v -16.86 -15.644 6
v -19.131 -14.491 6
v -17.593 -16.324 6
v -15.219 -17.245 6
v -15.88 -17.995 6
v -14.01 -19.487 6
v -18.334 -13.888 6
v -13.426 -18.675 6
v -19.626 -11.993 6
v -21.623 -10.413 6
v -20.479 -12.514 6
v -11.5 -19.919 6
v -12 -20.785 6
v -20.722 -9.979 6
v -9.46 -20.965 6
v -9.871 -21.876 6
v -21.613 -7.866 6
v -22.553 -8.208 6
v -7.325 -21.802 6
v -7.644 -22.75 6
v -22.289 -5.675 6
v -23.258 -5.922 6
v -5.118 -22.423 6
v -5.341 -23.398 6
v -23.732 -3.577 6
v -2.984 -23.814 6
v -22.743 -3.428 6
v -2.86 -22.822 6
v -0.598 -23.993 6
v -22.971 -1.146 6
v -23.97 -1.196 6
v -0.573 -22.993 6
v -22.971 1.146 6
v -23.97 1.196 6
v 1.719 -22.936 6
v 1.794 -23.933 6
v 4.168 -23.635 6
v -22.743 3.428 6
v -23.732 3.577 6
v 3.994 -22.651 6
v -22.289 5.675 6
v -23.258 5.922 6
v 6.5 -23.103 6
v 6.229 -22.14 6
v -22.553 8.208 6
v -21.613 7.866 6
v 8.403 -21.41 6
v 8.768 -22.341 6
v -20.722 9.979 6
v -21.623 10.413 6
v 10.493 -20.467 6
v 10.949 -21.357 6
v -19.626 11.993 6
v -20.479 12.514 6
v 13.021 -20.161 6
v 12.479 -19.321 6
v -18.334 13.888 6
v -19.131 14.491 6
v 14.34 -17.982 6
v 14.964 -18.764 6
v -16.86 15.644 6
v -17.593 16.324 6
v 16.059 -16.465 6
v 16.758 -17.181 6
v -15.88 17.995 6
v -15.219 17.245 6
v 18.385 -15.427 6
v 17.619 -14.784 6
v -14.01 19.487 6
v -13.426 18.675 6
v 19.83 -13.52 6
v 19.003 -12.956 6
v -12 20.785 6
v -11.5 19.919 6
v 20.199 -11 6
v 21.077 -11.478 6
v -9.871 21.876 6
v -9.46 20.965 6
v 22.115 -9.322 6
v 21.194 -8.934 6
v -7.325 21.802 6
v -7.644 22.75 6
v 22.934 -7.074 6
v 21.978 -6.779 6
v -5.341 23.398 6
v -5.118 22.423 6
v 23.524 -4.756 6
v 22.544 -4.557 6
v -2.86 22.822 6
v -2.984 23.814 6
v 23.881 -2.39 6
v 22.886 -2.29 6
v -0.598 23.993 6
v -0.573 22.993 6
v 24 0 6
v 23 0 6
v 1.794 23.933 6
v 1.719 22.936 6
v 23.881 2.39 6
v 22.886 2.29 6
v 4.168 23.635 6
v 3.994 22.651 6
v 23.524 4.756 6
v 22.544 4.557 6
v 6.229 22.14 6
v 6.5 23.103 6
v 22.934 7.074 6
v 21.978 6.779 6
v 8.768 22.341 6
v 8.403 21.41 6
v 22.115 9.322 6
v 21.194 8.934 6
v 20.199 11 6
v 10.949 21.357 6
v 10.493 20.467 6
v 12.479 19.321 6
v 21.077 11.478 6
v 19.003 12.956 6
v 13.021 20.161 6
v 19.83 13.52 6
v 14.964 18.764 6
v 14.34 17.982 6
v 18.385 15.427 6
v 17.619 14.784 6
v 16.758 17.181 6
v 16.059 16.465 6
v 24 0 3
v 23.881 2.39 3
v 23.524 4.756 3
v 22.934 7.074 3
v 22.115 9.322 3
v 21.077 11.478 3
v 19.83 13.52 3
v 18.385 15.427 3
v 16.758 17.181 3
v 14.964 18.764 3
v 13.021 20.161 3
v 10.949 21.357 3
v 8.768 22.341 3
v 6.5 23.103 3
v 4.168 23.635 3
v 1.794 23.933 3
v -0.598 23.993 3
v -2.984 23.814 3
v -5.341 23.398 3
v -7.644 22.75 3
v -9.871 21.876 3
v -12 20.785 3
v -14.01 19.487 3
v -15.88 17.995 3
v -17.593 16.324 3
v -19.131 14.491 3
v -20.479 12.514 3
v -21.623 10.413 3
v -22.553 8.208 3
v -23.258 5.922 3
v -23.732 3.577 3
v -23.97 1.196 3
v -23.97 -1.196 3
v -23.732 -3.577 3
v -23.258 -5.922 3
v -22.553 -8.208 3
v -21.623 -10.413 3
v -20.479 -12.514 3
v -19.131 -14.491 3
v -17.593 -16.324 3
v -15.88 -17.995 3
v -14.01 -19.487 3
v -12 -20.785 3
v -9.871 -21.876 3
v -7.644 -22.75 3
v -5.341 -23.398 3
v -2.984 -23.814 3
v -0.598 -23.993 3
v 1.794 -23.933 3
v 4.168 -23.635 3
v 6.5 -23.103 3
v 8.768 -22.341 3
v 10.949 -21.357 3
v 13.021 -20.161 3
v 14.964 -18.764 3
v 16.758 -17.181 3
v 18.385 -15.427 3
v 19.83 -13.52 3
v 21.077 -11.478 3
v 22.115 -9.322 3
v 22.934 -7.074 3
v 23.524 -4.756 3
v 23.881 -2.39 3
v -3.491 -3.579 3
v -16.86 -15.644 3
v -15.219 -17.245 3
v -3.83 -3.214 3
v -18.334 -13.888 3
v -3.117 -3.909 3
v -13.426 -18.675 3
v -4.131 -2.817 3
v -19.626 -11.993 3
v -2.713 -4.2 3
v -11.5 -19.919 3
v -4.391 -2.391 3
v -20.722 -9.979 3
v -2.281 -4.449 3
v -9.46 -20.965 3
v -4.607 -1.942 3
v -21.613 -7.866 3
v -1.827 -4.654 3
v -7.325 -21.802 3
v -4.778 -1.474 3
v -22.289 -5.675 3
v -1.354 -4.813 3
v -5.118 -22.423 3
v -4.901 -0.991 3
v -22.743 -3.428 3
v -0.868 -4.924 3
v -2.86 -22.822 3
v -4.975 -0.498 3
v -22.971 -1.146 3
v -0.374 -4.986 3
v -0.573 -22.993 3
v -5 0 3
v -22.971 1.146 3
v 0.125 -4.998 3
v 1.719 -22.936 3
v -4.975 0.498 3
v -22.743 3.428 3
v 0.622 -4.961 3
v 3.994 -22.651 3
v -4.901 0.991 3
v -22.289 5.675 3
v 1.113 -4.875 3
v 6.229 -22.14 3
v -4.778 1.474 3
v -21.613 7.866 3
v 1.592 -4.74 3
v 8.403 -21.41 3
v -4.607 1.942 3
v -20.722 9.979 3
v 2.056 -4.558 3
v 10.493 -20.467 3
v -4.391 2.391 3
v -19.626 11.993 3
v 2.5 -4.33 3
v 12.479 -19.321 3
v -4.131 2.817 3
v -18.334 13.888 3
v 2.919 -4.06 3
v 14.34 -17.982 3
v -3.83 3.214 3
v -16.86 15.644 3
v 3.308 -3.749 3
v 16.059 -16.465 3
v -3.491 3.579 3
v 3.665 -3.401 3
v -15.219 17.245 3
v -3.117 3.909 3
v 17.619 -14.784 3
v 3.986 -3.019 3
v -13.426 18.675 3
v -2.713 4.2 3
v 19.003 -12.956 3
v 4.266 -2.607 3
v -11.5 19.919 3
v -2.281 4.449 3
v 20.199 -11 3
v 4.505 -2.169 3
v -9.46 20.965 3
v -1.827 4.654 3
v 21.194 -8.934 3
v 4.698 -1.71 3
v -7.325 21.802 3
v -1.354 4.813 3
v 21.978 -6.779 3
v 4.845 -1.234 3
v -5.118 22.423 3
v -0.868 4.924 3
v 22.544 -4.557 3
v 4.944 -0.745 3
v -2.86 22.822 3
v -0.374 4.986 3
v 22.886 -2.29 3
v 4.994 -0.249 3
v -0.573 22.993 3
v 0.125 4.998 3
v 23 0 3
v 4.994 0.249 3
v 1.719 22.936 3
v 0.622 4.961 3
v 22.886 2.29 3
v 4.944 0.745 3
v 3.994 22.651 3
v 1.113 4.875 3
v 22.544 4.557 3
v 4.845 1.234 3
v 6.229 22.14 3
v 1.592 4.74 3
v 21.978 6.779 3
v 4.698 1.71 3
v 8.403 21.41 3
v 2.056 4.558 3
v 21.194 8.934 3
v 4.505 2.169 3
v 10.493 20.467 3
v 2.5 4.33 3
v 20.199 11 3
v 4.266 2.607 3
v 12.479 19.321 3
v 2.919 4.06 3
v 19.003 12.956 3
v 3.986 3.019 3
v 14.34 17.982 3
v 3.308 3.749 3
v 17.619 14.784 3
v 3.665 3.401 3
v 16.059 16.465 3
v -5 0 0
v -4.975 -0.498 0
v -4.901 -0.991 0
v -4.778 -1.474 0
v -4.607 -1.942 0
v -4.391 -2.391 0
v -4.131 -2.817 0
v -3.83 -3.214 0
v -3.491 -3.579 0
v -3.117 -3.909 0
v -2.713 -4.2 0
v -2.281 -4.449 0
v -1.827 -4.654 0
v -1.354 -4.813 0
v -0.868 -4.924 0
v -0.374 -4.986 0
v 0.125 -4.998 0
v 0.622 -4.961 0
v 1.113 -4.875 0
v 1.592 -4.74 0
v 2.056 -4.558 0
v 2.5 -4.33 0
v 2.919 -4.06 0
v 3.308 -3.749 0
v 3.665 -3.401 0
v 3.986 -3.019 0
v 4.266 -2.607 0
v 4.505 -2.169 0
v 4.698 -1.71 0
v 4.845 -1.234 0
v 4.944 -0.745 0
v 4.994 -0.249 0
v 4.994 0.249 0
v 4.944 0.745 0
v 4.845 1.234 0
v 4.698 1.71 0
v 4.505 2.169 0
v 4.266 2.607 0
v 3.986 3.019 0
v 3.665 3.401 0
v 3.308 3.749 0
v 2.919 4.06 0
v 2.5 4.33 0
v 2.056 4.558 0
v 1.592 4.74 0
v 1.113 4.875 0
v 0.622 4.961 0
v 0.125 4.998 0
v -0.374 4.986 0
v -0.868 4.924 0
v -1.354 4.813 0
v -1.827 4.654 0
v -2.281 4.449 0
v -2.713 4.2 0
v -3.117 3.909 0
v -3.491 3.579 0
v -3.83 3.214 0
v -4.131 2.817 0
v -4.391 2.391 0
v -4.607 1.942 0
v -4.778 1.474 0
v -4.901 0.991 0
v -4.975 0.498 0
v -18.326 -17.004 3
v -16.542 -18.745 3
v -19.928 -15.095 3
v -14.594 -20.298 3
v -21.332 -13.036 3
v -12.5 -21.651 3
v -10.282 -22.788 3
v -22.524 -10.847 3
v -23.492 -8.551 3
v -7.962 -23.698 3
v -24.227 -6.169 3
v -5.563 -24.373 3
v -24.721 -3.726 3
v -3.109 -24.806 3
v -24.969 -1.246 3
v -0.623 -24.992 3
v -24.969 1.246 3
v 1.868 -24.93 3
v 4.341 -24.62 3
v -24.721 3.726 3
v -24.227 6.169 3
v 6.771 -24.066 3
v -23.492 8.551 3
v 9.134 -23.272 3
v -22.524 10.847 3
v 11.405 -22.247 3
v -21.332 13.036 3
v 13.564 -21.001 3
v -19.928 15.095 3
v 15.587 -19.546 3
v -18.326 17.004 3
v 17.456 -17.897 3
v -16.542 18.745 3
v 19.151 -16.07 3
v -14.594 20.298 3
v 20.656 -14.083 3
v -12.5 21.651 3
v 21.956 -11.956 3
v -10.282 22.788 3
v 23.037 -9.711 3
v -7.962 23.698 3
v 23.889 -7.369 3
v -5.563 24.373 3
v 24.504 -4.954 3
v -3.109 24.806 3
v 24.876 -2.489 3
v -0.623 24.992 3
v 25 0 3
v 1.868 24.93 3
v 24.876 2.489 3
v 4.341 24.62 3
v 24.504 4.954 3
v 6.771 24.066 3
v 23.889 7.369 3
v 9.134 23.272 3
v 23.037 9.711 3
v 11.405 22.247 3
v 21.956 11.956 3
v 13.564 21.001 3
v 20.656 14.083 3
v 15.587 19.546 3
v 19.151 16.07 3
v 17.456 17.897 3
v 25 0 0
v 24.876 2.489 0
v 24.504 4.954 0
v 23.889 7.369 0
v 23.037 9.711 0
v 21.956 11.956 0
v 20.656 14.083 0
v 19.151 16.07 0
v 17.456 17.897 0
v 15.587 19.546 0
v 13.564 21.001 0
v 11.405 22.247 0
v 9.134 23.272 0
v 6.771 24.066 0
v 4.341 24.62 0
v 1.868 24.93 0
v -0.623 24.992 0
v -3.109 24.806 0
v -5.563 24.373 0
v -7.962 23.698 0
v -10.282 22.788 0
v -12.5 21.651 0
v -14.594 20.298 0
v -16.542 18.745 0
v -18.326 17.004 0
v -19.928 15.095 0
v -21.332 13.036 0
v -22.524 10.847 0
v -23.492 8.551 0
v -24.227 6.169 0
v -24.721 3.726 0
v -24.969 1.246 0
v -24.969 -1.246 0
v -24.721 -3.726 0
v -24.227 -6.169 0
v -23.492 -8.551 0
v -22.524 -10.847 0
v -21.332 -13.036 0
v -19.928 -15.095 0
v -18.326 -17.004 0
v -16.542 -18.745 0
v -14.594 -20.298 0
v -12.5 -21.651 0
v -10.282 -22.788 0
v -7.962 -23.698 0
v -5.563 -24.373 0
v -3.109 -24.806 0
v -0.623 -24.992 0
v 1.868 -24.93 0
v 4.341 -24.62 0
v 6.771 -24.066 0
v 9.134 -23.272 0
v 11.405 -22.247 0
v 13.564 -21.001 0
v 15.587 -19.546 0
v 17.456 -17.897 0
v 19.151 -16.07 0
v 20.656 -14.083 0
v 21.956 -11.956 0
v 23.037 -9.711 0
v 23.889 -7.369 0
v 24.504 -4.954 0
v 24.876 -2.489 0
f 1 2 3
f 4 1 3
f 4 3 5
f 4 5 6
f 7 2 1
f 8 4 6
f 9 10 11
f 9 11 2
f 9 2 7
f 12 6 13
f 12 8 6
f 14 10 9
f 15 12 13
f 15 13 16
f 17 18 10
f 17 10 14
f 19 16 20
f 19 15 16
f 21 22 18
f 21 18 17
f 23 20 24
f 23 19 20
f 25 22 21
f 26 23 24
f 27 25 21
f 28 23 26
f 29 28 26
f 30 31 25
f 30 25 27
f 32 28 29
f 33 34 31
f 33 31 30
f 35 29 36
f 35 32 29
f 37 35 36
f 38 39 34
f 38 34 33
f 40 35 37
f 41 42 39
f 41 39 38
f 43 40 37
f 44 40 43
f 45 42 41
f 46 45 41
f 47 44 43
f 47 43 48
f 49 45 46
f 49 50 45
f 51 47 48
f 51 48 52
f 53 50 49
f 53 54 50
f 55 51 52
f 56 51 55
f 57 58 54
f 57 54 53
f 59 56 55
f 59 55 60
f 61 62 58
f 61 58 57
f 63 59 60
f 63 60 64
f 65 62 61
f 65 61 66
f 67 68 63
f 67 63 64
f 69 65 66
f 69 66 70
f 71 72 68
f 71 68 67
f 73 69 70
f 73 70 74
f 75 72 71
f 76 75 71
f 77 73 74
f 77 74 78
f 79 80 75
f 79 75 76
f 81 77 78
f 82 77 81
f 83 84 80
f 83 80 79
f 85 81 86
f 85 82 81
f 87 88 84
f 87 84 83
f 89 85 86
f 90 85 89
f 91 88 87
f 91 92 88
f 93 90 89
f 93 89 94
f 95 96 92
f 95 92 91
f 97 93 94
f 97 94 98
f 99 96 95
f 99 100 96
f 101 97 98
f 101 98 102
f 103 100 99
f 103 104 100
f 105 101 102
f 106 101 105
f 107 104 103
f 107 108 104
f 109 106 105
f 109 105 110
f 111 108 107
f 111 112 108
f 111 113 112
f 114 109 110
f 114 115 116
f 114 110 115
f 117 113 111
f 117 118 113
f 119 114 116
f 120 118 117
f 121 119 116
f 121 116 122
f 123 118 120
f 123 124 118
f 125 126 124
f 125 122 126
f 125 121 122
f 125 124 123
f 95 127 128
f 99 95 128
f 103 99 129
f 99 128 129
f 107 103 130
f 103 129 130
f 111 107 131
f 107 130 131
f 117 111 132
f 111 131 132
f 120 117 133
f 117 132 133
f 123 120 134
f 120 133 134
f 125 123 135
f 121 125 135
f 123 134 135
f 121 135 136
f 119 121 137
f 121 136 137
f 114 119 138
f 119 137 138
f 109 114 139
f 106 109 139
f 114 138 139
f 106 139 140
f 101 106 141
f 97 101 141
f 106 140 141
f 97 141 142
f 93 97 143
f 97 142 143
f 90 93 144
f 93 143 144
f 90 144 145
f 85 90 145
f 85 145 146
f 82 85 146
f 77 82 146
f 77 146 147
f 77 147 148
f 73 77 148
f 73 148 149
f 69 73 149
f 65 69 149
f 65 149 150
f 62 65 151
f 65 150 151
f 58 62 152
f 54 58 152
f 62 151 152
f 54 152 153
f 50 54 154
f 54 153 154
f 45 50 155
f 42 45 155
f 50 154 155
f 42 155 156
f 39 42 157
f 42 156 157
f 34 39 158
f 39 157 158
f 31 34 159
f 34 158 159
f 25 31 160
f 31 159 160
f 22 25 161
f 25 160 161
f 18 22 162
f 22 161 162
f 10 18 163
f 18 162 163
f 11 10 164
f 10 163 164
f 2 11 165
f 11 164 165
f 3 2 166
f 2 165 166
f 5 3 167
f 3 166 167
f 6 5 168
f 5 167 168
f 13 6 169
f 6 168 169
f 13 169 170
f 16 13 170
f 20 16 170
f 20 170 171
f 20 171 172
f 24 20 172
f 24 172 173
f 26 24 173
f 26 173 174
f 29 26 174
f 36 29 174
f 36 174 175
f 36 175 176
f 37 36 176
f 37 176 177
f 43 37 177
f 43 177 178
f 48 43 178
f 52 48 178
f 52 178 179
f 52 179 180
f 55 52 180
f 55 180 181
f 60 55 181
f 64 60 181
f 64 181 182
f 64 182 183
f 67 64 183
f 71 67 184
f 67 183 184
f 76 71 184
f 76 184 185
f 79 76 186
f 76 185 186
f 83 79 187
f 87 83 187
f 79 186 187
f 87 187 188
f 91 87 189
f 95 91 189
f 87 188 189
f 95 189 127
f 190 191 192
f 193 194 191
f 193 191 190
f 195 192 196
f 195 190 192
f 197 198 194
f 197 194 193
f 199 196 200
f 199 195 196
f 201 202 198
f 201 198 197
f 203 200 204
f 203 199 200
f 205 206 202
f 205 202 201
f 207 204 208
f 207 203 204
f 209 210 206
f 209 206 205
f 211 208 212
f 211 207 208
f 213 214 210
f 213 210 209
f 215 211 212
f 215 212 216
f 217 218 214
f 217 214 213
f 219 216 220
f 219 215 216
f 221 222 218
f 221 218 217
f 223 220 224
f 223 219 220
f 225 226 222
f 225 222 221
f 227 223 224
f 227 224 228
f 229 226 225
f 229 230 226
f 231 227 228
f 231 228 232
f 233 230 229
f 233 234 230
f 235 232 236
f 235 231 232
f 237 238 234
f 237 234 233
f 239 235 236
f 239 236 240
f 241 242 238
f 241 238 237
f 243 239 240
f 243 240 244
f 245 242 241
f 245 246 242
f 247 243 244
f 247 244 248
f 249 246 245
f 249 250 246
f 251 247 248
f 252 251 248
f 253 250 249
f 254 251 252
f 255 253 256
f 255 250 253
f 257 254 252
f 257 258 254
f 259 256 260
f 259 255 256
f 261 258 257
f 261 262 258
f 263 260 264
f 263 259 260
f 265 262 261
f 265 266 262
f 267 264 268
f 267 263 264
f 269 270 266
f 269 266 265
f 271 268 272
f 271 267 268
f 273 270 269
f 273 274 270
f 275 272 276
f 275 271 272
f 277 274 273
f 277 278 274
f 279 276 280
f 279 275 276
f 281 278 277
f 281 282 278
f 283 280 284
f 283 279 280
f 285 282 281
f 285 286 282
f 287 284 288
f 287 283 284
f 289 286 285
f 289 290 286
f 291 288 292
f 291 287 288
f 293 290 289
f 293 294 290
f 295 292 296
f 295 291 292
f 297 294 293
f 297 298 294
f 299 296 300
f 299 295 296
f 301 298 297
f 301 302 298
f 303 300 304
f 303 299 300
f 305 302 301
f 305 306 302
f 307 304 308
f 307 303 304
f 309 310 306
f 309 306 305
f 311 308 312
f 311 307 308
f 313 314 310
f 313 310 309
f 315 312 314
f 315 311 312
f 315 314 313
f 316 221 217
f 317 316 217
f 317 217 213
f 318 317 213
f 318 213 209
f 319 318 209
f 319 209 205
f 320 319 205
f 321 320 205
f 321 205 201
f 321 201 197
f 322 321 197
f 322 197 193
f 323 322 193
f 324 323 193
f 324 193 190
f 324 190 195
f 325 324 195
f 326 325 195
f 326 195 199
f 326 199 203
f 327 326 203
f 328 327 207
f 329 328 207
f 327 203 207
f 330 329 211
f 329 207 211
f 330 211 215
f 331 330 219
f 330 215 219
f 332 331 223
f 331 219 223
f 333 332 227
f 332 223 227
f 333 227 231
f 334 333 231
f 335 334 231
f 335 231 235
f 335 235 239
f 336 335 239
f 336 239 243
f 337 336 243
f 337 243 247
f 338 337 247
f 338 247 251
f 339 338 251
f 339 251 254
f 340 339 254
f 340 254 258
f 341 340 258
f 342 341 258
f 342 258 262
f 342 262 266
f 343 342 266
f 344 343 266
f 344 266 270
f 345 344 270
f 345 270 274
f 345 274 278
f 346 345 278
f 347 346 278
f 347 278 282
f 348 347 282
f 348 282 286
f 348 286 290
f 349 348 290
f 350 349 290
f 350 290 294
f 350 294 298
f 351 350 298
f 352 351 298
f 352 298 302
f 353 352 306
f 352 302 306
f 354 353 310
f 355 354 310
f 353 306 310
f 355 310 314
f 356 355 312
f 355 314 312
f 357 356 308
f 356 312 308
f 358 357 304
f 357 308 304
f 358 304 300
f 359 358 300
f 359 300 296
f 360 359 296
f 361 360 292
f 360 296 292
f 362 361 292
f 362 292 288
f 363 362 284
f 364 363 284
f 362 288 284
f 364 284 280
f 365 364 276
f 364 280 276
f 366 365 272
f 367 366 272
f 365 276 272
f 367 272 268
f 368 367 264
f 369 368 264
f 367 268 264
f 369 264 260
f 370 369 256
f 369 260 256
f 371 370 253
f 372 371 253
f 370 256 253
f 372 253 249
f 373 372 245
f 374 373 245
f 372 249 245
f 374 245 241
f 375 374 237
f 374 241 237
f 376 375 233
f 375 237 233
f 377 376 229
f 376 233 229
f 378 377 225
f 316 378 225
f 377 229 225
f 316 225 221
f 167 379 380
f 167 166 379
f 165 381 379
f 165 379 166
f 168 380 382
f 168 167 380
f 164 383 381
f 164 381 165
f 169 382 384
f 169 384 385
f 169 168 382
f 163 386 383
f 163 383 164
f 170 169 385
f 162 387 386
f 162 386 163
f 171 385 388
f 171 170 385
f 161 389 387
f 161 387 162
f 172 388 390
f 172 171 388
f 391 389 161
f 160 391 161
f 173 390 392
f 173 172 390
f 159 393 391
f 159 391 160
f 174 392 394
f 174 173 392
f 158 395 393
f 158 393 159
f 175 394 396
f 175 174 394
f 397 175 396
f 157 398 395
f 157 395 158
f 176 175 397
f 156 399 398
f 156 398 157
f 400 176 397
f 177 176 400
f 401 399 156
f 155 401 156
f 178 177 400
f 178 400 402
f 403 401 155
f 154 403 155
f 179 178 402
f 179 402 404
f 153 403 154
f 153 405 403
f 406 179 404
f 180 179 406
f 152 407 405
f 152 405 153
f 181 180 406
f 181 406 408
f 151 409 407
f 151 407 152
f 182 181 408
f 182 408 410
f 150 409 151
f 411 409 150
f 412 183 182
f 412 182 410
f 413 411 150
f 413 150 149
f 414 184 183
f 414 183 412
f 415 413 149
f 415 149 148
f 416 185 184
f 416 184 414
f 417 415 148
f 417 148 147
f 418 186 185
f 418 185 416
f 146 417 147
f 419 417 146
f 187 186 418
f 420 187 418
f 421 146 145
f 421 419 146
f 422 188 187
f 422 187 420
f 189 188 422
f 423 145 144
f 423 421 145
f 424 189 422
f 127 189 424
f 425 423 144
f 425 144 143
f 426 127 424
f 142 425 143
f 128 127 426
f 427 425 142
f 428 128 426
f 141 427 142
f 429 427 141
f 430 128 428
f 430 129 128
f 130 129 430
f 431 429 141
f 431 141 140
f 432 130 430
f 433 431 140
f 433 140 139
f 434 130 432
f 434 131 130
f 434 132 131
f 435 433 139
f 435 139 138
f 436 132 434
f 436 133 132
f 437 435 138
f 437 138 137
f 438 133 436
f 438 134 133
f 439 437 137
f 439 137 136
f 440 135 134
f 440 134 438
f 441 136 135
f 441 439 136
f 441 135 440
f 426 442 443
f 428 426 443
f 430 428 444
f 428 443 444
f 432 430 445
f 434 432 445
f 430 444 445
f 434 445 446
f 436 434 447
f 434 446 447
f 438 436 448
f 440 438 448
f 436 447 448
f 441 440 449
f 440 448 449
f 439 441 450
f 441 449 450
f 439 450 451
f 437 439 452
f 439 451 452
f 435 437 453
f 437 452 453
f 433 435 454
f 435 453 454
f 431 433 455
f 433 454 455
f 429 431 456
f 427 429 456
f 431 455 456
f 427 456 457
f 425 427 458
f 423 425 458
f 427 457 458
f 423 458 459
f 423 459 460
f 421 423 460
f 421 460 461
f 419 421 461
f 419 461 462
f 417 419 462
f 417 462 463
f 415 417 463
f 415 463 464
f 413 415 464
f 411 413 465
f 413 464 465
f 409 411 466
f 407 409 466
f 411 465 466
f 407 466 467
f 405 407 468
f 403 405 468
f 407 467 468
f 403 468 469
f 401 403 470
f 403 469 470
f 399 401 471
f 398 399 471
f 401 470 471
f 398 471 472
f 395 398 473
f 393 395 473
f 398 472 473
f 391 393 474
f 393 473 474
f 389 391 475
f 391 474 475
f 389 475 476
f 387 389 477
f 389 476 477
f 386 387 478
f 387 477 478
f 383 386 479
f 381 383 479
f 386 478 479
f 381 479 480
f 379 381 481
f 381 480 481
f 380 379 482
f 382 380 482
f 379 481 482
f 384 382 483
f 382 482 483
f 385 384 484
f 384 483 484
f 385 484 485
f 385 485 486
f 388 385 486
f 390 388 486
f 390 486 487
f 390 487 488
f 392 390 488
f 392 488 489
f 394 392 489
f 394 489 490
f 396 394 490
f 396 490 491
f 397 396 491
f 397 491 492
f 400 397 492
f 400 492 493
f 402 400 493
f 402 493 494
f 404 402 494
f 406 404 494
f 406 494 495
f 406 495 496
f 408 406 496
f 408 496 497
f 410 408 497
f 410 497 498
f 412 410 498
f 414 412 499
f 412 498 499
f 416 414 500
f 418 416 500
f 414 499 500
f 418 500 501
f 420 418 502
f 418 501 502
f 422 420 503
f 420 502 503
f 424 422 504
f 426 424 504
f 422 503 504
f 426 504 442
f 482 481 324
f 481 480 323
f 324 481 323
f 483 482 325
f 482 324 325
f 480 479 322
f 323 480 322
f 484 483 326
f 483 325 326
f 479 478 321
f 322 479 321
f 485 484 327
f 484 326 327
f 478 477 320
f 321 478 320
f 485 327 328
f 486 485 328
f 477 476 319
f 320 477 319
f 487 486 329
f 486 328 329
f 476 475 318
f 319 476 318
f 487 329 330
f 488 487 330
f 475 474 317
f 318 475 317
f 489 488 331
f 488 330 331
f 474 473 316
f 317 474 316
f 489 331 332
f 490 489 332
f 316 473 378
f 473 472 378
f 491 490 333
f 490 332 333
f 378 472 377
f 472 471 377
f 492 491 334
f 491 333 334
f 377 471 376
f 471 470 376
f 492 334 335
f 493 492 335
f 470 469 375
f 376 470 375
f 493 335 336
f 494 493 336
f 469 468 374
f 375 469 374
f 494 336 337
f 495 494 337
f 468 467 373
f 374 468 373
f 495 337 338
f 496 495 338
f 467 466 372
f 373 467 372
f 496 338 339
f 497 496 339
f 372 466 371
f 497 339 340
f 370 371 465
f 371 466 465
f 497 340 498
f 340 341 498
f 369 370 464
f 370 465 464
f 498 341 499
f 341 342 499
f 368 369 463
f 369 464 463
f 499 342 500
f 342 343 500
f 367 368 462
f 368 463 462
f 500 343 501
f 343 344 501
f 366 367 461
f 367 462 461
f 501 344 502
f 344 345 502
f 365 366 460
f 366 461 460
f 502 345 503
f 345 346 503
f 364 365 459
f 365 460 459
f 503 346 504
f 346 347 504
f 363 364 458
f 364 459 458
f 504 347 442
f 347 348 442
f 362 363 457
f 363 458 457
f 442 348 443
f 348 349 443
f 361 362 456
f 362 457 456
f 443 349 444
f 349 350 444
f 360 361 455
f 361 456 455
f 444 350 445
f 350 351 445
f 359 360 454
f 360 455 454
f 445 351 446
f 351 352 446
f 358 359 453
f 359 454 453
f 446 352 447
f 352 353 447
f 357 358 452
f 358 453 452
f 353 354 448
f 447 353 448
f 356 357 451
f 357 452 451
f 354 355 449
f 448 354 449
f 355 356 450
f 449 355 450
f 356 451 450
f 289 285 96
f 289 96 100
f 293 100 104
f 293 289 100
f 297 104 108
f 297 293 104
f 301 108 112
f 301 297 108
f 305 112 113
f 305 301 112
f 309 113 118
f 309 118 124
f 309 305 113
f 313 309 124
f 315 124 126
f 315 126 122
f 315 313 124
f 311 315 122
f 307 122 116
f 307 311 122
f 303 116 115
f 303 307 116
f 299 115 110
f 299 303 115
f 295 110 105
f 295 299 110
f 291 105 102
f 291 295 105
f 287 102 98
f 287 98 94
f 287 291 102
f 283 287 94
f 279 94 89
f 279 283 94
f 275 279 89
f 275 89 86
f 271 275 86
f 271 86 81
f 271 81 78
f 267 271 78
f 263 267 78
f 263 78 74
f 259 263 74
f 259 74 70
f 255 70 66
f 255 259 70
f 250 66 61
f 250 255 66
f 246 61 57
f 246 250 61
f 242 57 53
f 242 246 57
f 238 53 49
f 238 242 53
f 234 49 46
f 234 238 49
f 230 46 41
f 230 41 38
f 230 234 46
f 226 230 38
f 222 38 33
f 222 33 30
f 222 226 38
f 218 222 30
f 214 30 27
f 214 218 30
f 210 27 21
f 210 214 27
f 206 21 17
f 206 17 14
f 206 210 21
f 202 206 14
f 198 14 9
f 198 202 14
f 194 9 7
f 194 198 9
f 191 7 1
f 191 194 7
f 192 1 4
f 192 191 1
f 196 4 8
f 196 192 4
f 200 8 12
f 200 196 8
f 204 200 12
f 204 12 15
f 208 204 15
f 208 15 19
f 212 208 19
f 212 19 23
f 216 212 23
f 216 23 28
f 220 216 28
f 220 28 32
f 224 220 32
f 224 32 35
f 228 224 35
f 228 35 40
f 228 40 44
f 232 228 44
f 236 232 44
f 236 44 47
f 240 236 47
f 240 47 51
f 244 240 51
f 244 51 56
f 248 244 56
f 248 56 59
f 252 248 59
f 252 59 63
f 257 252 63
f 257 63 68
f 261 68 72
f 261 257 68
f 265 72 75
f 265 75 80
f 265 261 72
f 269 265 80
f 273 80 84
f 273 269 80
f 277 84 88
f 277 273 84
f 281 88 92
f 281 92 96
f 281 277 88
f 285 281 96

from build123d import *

# Parameters (mm, degrees)
F0_R     = 25
F1_DEPTH = 3
F2_R     = 24
F2_R_2   = 23
F3_DEPTH = 3
F4_D     = 10


with BuildPart() as f1:
    # F0 (on Top) → F1 (new body)
    with BuildSketch(Plane.XY):
        Circle(F0_R)
    extrude(amount=F1_DEPTH)

    # F2 (on face) → F3 (join)
    with BuildSketch(Plane.XY.offset(3)):
        Circle(F2_R)
        Circle(F2_R_2, mode=Mode.SUBTRACT)
    extrude(amount=F3_DEPTH)

    # F4 (through all)
    with Locations(Plane(origin=(0, 0, 0), x_dir=(1, 0, 0), z_dir=(0, 0, -1))):
        with Locations((0, 0)):
            Hole(F4_D / 2)


solid = f1.part
